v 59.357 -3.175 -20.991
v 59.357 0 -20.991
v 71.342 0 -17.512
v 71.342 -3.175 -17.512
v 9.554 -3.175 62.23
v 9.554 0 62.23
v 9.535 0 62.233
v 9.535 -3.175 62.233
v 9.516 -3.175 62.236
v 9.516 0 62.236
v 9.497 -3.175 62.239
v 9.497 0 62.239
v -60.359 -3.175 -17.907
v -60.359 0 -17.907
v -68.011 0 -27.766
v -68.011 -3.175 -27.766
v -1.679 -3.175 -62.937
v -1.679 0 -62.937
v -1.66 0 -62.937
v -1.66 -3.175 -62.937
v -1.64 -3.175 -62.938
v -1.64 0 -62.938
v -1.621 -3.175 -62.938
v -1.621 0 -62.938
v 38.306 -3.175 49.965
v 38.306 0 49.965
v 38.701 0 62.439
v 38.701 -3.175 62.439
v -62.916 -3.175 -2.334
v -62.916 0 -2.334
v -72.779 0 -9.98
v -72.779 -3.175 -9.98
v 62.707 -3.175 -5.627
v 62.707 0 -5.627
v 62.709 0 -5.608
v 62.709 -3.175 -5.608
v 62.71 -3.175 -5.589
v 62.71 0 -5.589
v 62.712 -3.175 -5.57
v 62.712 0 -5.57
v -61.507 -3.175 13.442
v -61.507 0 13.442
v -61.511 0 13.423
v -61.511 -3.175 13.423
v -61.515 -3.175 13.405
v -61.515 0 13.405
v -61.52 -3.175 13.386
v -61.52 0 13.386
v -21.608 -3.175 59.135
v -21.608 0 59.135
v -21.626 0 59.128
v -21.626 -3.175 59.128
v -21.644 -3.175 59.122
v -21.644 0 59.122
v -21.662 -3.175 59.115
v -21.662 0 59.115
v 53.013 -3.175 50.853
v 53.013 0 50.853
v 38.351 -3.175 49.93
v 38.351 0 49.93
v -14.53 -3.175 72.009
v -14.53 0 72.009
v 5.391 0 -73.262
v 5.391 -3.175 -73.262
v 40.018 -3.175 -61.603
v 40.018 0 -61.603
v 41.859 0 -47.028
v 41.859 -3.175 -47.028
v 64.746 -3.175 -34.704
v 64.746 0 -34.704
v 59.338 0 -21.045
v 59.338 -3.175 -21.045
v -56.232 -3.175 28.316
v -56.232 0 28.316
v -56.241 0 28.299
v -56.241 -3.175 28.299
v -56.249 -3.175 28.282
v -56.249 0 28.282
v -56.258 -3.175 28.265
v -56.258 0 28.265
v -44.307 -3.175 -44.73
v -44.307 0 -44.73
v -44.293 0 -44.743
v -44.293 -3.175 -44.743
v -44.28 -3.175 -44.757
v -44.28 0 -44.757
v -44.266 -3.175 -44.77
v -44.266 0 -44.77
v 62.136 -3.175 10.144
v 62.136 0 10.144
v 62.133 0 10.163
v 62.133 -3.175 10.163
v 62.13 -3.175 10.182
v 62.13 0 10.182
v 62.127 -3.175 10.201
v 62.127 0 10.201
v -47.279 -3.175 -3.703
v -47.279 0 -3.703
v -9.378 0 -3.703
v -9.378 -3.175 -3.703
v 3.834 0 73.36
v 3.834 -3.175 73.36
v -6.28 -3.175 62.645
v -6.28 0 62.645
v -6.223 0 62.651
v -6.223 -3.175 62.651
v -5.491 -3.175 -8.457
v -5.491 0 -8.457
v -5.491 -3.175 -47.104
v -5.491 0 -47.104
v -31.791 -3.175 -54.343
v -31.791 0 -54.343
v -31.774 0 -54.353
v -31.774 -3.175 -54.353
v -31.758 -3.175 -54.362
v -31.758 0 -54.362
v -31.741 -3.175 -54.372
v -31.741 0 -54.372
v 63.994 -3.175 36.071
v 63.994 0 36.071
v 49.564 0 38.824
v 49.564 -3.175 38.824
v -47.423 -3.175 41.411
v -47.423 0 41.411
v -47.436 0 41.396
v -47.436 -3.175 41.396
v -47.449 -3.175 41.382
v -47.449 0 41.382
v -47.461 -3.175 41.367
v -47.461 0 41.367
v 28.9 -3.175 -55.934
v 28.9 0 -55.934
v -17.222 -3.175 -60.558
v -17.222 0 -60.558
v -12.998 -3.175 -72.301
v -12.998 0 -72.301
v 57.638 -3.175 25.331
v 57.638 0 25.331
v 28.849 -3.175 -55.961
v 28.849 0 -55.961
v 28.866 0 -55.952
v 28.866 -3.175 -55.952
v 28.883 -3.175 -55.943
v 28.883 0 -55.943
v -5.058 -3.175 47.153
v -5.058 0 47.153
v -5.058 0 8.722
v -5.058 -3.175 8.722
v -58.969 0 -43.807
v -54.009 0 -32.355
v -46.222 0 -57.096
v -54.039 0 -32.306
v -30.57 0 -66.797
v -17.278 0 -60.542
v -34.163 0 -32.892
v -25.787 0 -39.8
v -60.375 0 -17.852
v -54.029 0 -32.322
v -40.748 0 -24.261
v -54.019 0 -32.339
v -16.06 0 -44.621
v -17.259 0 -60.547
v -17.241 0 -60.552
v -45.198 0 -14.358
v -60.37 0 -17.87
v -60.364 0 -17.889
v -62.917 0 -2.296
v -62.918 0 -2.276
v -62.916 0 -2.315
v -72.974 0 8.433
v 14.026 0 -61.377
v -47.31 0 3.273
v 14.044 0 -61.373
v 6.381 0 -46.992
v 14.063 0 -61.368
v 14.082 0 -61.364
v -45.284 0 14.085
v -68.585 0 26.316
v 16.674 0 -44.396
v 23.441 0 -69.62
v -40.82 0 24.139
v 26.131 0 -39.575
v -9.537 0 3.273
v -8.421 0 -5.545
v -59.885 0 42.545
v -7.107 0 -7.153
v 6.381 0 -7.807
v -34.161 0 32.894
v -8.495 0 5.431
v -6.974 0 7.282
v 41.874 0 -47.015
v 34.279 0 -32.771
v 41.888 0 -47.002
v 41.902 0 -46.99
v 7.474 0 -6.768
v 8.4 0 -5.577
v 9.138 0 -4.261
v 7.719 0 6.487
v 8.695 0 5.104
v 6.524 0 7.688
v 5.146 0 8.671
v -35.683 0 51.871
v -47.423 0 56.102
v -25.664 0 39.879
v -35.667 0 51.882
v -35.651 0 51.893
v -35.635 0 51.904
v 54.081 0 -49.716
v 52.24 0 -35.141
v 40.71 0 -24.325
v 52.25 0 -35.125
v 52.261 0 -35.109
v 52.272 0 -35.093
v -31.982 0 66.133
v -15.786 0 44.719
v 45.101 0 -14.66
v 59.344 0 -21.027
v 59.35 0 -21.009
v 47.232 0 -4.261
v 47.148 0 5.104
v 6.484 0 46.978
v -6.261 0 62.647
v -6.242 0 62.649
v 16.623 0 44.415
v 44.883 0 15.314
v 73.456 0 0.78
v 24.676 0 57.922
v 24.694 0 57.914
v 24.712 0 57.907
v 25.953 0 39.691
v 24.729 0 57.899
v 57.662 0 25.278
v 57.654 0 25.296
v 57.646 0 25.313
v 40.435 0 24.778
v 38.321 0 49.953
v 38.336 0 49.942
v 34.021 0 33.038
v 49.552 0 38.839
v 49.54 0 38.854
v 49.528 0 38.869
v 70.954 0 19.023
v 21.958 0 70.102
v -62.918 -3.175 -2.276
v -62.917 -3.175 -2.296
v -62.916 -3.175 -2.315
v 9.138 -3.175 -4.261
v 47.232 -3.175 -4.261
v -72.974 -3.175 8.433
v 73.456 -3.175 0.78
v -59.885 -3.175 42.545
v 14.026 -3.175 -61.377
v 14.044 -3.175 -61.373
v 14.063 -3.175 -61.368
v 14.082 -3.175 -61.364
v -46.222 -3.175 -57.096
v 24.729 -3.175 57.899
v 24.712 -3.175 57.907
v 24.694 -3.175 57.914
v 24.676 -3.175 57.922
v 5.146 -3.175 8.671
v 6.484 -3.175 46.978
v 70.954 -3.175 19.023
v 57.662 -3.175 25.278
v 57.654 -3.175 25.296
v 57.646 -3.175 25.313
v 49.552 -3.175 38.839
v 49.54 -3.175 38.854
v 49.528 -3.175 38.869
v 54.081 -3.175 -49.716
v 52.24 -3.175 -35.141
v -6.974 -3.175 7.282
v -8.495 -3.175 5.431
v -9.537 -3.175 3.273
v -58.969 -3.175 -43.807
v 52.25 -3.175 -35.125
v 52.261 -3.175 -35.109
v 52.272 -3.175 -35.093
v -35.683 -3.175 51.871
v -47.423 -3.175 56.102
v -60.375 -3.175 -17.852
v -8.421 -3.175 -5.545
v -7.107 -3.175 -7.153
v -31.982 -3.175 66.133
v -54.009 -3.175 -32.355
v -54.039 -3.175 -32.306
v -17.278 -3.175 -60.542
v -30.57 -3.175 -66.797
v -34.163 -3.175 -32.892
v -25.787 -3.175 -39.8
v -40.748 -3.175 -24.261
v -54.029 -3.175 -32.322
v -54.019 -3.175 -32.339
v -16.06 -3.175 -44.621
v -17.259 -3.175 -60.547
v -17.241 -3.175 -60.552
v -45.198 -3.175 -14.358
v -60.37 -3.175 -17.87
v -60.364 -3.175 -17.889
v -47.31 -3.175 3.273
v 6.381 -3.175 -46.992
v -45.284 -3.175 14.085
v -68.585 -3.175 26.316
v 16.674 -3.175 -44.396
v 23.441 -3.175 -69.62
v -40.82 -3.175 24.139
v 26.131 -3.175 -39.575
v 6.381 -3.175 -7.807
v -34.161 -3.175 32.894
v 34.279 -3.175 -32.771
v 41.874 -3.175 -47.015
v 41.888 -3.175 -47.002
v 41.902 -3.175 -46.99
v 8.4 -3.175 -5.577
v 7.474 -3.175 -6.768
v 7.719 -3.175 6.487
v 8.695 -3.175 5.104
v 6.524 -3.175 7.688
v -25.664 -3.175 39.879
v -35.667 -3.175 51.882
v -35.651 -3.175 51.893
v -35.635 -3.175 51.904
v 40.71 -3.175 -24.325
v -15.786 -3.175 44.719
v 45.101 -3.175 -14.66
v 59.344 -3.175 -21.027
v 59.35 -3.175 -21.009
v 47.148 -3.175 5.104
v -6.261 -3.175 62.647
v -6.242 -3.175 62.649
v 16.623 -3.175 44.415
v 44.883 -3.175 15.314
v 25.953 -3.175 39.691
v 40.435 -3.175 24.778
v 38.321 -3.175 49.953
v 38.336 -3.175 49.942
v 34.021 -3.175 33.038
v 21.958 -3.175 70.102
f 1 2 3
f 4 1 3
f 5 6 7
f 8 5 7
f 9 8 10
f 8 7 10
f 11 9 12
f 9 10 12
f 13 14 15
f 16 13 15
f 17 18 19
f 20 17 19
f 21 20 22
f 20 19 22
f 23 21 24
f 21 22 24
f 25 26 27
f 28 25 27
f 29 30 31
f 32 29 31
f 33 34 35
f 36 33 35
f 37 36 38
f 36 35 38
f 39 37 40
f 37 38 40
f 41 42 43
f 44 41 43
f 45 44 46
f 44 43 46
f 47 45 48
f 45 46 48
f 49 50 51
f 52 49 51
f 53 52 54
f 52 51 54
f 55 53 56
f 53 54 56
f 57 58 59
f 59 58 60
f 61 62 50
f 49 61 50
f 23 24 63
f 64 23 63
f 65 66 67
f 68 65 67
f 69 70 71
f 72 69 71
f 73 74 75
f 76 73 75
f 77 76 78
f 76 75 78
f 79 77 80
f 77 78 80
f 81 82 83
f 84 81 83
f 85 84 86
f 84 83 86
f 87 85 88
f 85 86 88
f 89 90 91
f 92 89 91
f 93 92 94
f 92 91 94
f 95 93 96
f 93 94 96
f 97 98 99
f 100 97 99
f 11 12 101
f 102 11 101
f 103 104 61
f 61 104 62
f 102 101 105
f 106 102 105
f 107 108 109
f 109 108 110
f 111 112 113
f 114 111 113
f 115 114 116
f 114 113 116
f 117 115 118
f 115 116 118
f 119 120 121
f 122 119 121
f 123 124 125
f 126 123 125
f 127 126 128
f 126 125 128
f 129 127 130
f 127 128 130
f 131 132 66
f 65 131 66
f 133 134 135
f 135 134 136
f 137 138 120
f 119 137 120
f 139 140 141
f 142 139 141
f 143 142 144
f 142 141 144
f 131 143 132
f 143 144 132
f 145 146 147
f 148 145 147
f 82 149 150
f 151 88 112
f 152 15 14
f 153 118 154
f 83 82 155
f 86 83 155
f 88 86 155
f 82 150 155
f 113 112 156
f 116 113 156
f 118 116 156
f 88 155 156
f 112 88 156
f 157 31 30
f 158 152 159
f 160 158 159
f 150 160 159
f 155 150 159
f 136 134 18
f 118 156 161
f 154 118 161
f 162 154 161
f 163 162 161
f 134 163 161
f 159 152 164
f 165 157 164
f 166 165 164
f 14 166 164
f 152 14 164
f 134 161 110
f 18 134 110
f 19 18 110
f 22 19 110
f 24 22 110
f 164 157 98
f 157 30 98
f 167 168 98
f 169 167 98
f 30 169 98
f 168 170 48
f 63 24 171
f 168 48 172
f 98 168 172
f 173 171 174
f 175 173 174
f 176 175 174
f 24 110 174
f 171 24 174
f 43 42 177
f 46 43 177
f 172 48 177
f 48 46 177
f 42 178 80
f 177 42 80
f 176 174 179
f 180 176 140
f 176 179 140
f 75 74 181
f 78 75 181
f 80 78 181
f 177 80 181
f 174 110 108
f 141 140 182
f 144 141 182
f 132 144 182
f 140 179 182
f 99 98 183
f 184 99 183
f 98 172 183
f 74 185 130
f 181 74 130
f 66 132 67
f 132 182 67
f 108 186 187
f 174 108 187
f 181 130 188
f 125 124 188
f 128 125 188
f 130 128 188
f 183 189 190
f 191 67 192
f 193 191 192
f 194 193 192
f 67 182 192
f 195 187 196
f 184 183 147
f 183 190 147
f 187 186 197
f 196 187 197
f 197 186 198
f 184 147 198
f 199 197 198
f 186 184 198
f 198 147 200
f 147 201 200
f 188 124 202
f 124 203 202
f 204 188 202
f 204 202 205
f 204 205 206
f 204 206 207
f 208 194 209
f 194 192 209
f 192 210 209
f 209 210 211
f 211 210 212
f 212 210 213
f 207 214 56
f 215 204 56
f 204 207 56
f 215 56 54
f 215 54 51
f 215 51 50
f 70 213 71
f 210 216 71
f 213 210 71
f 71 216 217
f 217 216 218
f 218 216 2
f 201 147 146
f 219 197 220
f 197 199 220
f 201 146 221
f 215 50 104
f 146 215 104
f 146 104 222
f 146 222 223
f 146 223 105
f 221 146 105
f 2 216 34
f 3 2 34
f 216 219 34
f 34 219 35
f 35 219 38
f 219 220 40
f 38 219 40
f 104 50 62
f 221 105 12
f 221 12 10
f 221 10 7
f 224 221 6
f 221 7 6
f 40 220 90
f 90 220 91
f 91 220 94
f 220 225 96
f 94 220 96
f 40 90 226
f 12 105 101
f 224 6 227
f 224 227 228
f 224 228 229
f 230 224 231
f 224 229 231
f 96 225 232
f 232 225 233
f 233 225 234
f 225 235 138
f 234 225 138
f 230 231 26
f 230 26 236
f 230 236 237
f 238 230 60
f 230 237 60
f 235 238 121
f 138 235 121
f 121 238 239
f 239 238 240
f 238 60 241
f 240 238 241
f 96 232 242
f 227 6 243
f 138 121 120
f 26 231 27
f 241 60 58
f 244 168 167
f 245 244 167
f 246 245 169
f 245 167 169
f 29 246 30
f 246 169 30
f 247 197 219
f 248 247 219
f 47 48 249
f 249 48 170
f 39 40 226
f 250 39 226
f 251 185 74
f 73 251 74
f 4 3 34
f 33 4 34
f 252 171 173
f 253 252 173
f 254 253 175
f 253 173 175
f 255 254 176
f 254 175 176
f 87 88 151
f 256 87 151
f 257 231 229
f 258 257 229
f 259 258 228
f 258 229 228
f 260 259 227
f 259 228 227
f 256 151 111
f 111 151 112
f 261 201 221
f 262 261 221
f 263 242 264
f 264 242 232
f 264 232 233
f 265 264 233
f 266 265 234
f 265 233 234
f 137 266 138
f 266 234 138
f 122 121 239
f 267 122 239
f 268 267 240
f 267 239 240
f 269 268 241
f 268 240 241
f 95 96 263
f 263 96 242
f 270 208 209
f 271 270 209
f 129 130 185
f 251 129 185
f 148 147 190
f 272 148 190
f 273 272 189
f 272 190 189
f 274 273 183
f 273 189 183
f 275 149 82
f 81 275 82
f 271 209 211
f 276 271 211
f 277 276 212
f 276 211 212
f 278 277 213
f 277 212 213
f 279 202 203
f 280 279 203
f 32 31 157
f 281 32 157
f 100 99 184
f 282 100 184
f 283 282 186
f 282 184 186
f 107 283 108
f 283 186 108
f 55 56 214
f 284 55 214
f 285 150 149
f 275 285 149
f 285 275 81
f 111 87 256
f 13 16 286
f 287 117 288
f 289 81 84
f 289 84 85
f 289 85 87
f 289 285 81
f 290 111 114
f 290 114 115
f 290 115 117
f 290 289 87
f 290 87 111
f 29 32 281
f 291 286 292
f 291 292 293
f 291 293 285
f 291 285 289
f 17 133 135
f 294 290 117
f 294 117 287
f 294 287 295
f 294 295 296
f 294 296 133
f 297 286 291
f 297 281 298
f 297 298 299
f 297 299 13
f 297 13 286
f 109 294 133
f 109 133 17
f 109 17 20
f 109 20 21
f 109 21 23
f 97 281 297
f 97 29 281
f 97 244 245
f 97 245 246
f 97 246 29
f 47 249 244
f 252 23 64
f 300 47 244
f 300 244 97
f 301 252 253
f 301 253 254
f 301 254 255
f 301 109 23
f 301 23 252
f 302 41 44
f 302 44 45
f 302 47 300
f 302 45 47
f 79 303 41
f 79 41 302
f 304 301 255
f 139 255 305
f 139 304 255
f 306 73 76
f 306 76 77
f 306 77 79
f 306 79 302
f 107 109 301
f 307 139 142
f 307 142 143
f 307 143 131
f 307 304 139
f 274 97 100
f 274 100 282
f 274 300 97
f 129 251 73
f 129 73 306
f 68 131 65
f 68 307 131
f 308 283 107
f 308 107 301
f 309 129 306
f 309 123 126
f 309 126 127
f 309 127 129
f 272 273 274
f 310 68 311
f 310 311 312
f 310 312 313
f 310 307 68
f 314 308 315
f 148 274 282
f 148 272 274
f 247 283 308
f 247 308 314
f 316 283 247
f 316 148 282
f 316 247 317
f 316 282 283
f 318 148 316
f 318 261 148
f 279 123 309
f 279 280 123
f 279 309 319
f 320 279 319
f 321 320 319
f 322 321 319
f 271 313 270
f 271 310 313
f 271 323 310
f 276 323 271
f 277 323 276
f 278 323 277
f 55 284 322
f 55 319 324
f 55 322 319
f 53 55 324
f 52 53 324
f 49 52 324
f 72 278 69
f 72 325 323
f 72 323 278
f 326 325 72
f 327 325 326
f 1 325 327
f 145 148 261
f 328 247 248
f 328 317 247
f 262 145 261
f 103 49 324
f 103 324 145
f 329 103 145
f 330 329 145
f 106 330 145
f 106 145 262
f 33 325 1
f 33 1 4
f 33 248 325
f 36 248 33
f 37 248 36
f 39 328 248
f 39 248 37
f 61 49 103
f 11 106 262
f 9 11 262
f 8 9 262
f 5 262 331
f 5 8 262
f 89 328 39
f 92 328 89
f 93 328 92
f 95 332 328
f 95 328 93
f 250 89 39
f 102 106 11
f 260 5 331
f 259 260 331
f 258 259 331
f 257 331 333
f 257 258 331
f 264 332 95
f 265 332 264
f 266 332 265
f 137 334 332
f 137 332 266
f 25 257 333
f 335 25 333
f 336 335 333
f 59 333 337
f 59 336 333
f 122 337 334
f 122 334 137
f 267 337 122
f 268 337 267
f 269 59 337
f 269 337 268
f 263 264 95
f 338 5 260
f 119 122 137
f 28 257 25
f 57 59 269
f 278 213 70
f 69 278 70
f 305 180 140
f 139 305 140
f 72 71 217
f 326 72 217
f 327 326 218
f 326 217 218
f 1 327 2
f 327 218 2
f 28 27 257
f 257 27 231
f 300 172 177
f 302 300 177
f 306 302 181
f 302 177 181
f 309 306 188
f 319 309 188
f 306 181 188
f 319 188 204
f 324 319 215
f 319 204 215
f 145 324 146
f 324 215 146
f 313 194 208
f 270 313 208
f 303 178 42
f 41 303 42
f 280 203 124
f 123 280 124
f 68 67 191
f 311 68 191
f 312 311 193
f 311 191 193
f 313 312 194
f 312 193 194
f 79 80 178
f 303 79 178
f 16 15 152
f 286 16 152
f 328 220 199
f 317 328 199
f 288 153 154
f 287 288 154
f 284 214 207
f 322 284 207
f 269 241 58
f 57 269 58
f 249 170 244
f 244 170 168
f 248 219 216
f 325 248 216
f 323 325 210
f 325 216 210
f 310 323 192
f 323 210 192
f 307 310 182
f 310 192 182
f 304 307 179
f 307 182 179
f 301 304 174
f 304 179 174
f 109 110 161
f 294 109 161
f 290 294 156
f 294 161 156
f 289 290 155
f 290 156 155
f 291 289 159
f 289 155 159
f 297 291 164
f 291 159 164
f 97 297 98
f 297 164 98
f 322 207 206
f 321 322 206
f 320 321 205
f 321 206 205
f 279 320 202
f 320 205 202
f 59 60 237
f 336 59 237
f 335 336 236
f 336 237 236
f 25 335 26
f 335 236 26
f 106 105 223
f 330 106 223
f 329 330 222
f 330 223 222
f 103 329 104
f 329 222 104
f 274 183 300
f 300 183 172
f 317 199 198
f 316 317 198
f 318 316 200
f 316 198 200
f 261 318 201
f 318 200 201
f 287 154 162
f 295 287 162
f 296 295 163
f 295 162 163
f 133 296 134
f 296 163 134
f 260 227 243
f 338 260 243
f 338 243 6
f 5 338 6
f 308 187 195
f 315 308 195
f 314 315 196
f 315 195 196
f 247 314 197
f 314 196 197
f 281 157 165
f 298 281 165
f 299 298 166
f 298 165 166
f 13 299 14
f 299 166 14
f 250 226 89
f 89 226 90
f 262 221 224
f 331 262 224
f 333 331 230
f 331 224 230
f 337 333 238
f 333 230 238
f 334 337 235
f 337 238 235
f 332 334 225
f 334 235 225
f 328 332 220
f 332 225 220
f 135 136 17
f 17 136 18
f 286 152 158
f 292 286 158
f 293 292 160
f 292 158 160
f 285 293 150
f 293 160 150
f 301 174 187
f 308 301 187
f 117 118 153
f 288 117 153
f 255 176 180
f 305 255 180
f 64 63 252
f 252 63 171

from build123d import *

# Parameters (mm, degrees)
F1_DEPTH = 3.175


with BuildPart() as f1:
    # F0 (on Front) → F1 (new body)
    with BuildSketch(Plane.XZ):
        with BuildLine():
            ThreePointArc((62.7121740453, -5.569838893), (62.8972882371, -2.7876533502), (62.9590333374, 0))
            ThreePointArc((62.9590333374, 0), (62.7530476298, 5.088702384), (62.1364383711, 10.1441069263))
            ThreePointArc((62.1364383711, 10.1441069263), (62.1317848967, 10.1725701931), (62.1271183838, 10.2010313252))
            ThreePointArc((62.1271183838, 10.2010313252), (60.3668960989, 17.879533947), (57.6615710919, 25.2781150008))
            ThreePointArc((57.6615710919, 25.2781150008), (57.6499852883, 25.3045267697), (57.6383873868, 25.3309332285))
            ThreePointArc((57.6383873868, 25.3309332285), (54.0238997712, 32.3304520892), (49.5636152365, 38.8238061434))
            ThreePointArc((49.5636152365, 38.8238061434), (49.5458250824, 38.8465068659), (49.5280245311, 38.8691994364))
            ThreePointArc((49.5280245311, 38.8691994364), (44.2863831348, 44.7499290236), (38.3513951536, 49.9300547621))
            ThreePointArc((38.3513951536, 49.9300547621), (38.3285184698, 49.9476180682), (38.3056337427, 49.9651708928))
            ThreePointArc((38.3056337427, 49.9651708928), (31.7661901722, 54.3576033387), (24.7294158667, 57.8990144102))
            ThreePointArc((24.7294158667, 57.8990144102), (24.7028900793, 57.9103367328), (24.6763591081, 57.9216469029))
            ThreePointArc((24.6763591081, 57.9216469029), (17.2500106531, 60.5497895227), (9.5535964324, 62.2299660452))
            ThreePointArc((9.5535964324, 62.2299660452), (9.5250882543, 62.2343359612), (9.4965780774, 62.2386928172))
            ThreePointArc((9.4965780774, 62.2386928172), (1.6499495237, 62.9374097445), (-6.2225106014, 62.6507800478))
            ThreePointArc((-6.2225106014, 62.6507800478), (-6.2512098966, 62.6479229792), (-6.2799078799, 62.6450527639))
            ThreePointArc((-6.2799078799, 62.6450527639), (-14.0537840025, 61.3704410444), (-21.6076344094, 59.1350151265))
            ThreePointArc((-21.6076344094, 59.1350151265), (-21.6347215393, 59.1251105935), (-21.6618041293, 59.1151936531))
            ThreePointArc((-21.6618041293, 59.1151936531), (-28.8744665935, 55.9473418289), (-35.63507108, 51.9035797214))
            ThreePointArc((-35.63507108, 51.9035797214), (-35.6588440608, 51.8872500623), (-35.6826095586, 51.8709095146))
            ThreePointArc((-35.6826095586, 51.8709095146), (-41.8808602557, 47.0088653663), (-47.4234251781, 41.4108515145))
            ThreePointArc((-47.4234251781, 41.4108515145), (-47.4423902659, 41.3891227817), (-47.4613453979, 41.3673853634))
            ThreePointArc((-47.4613453979, 41.3673853634), (-52.2557254409, 35.1166490062), (-56.2319910611, 28.3161272084))
            ThreePointArc((-56.2319910611, 28.3161272084), (-56.2449566097, 28.2903646982), (-56.2579103552, 28.2645962512))
            ThreePointArc((-56.2579103552, 28.2645962512), (-59.3471712136, 21.017924439), (-61.5072941389, 13.4421964904))
            ThreePointArc((-61.5072941389, 13.4421964904), (-61.5134454752, 13.414018956), (-61.5195839028, 13.3858386066))
            ThreePointArc((-61.5195839028, 13.3858386066), (-62.7096159553, 5.5985663809), (-62.917867718, -2.27635687))
            ThreePointArc((-62.917867718, -2.27635687), (-62.9168183308, -2.3051789305), (-62.9157557406, -2.3340005073))
            ThreePointArc((-62.9157557406, -2.3340005073), (-62.1317848967, -10.1725701931), (-60.3750802726, -17.8518783565))
            ThreePointArc((-60.3750802726, -17.8518783565), (-60.3668960989, -17.879533947), (-60.3586992572, -17.9071857854))
            ThreePointArc((-60.3586992572, -17.9071857854), (-57.6499852883, -25.3045267697), (-54.0387044897, -32.3057006712))
            ThreePointArc((-54.0387044897, -32.3057006712), (-54.0238997712, -32.3304520892), (-54.0090837158, -32.3551967227))
            ThreePointArc((-54.0090837158, -32.3551967227), (-49.5458250824, -38.8465068659), (-44.3068781632, -44.7296370006))
            ThreePointArc((-44.3068781632, -44.7296370006), (-44.2863831348, -44.7499290236), (-44.2658788129, -44.7702116557))
            ThreePointArc((-44.2658788129, -44.7702116557), (-38.3285184698, -49.9476180682), (-31.7910877325, -54.3430457332))
            ThreePointArc((-31.7910877325, -54.3430457332), (-31.7661901722, -54.3576033387), (-31.7412859458, -54.3721495371))
            ThreePointArc((-31.7412859458, -54.3721495371), (-24.7028900793, -57.9103367328), (-17.27774634, -60.5418810427))
            ThreePointArc((-17.27774634, -60.5418810427), (-17.2500106531, -60.5497895227), (-17.2222713463, -60.5576852964))
            ThreePointArc((-17.2222713463, -60.5576852964), (-9.5250882543, -62.2343359612), (-1.678780602, -62.9366473088))
            ThreePointArc((-1.678780602, -62.9366473088), (-1.6499495237, -62.9374097445), (-1.6211180991, -62.9381589728))
            ThreePointArc((-1.6211180991, -62.9381589728), (6.2512098966, -62.6479229792), (14.0256690955, -61.3768725596))
            ThreePointArc((14.0256690955, -61.3768725596), (14.0537840025, -61.3704410444), (14.0818959603, -61.3639966507))
            ThreePointArc((14.0818959603, -61.3639966507), (21.6347215393, -59.1251105935), (28.8488344208, -55.9605631792))
            ThreePointArc((28.8488344208, -55.9605631792), (28.8744665935, -55.9473418289), (28.900092707, -55.9341087379))
            ThreePointArc((28.900092707, -55.9341087379), (35.6588440608, -51.8872500623), (41.8593213809, -47.0280458057))
            ThreePointArc((41.8593213809, -47.0280458057), (41.8808602557, -47.0088653663), (41.9023903417, -46.989675062))
            ThreePointArc((41.9023903417, -46.989675062), (47.4423902659, -41.3891227817), (52.2396332309, -35.1405833572))
            ThreePointArc((52.2396332309, -35.1405833572), (52.2557254409, -35.1166490062), (52.2718066851, -35.0927072859))
            ThreePointArc((52.2718066851, -35.0927072859), (56.2449566097, -28.2903646982), (59.3375368009, -21.0451088183))
            ThreePointArc((59.3375368009, -21.0451088183), (59.3471712136, -21.017924439), (59.3567931722, -20.9907356491))
            ThreePointArc((59.3567931722, -20.9907356491), (61.5134454752, -13.414018956), (62.7070447056, -5.6272926939))
            ThreePointArc((62.7070447056, -5.6272926939), (62.7096159553, -5.5985663809), (62.7121740453, -5.569838893))
        make_face()
        with BuildLine():
            ThreePointArc((6.4842174363, 46.9780393361), (34.0214251963, 33.038218524), (47.1479445438, 5.104172893))
            ThreePointArc((47.1479445438, 5.104172893), (47.3545049388, 2.5558007797), (47.4234251781, 0))
            ThreePointArc((47.4234251781, 0), (47.375446226, -2.132686219), (47.2316064517, -4.2610571003))
            ThreePointArc((47.2316064517, -4.2610571003), (34.2791282202, -32.7707586743), (6.3807374771, -46.9922062141))
            ThreePointArc((6.3807374771, -46.9922062141), (0.448456932, -47.4213047269), (-5.4908777614, -47.1044744906))
            ThreePointArc((-5.4908777614, -47.1044744906), (-34.1626695471, -32.8921459476), (-47.2786672976, -3.7025496874))
            ThreePointArc((-47.2786672976, -3.7025496874), (-47.4229358339, -0.2154356435), (-47.3103555233, 3.2728452281))
            ThreePointArc((-47.3103555233, 3.2728452281), (-34.1610578081, 32.8938198612), (-5.0580612114, 47.1529137213))
            ThreePointArc((-5.0580612114, 47.1529137213), (0.7184188591, 47.4179831917), (6.4842174363, 46.9780393361))
        make_face(mode=Mode.SUBTRACT)
        with BuildLine():
            ThreePointArc((62.1364383711, 10.1441069263), (62.7530476298, 5.088702384), (62.9590333374, 0))
            ThreePointArc((62.9590333374, 0), (62.8972882371, -2.7876533502), (62.7121740453, -5.569838893))
            Line((62.7121740453, -5.569838893), (73.4559661565, 0.7797791477))
            Line((73.4559661565, 0.7797791477), (62.1364383711, 10.1441069263))
        make_face()
        with BuildLine():
            ThreePointArc((57.6615710919, 25.2781150008), (60.3668960989, 17.879533947), (62.1271183838, 10.2010313252))
            Line((62.1271183838, 10.2010313252), (70.9542887154, 19.0230368869))
            Line((70.9542887154, 19.0230368869), (57.6615710919, 25.2781150008))
        make_face()
        with BuildLine():
            Line((71.3421350919, -17.5124749832), (62.7070447056, -5.6272926939))
            ThreePointArc((62.7070447056, -5.6272926939), (61.5134454752, -13.414018956), (59.3567931722, -20.9907356491))
            Line((59.3567931722, -20.9907356491), (71.3421350919, -17.5124749832))
        make_face()
        with BuildLine():
            ThreePointArc((49.5636152365, 38.8238061434), (54.0238997712, 32.3304520892), (57.6383873868, 25.3309332285))
            Line((57.6383873868, 25.3309332285), (63.9942923626, 36.0710072567))
            Line((63.9942923626, 36.0710072567), (49.5636152365, 38.8238061434))
        make_face()
        with BuildLine():
            Line((64.7456153015, -34.7043559045), (59.3375368009, -21.0451088183))
            ThreePointArc((59.3375368009, -21.0451088183), (56.2449566097, -28.2903646982), (52.2718066851, -35.0927072859))
            Line((52.2718066851, -35.0927072859), (64.7456153015, -34.7043559045))
        make_face()
        with BuildLine():
            ThreePointArc((38.3513951536, 49.9300547621), (44.2863831348, 44.7499290236), (49.5280245311, 38.8691994364))
            Line((49.5280245311, 38.8691994364), (53.0132992662, 50.8525035807))
            Line((53.0132992662, 50.8525035807), (38.3513951536, 49.9300547621))
        make_face()
        with BuildLine():
            Line((54.0808903839, -49.7156345106), (52.2396332309, -35.1405833572))
            ThreePointArc((52.2396332309, -35.1405833572), (47.4423902659, -41.3891227817), (41.9023903417, -46.989675062))
            Line((41.9023903417, -46.989675062), (54.0808903839, -49.7156345106))
        make_face()
        with BuildLine():
            ThreePointArc((24.7294158667, 57.8990144102), (31.7661901722, 54.3576033387), (38.3056337427, 49.9651708928))
            Line((38.3056337427, 49.9651708928), (38.7012856076, 62.4387500822))
            Line((38.7012856076, 62.4387500822), (24.7294158667, 57.8990144102))
        make_face()
        with BuildLine():
            Line((40.0180642279, -61.6030969592), (41.8593213809, -47.0280458057))
            ThreePointArc((41.8593213809, -47.0280458057), (35.6588440608, -51.8872500623), (28.900092707, -55.9341087379))
            Line((28.900092707, -55.9341087379), (40.0180642279, -61.6030969592))
        make_face()
        with BuildLine():
            ThreePointArc((9.5535964324, 62.2299660452), (17.2500106531, 60.5497895227), (24.6763591081, 57.9216469029))
            Line((24.6763591081, 57.9216469029), (21.9575278409, 70.1017402824))
            Line((21.9575278409, 70.1017402824), (9.5535964324, 62.2299660452))
        make_face()
        with BuildLine():
            Line((23.4407559203, -69.6198102654), (28.8488344208, -55.9605631792))
            ThreePointArc((28.8488344208, -55.9605631792), (21.6347215393, -59.1251105935), (14.0818959603, -61.3639966507))
            Line((14.0818959603, -61.3639966507), (23.4407559203, -69.6198102654))
        make_face()
        with BuildLine():
            ThreePointArc((-6.2225106014, 62.6507800478), (1.6499495237, 62.9374097445), (9.4965780774, 62.2386928172))
            Line((9.4965780774, 62.2386928172), (3.8340978458, 73.3599803245))
            Line((3.8340978458, 73.3599803245), (-6.2225106014, 62.6507800478))
        make_face()
        with BuildLine():
            Line((5.3905787092, -73.2620548489), (14.0256690955, -61.3768725596))
            ThreePointArc((14.0256690955, -61.3768725596), (6.2512098966, -62.6479229792), (-1.6211180991, -62.9381589728))
            Line((-1.6211180991, -62.9381589728), (5.3905787092, -73.2620548489))
        make_face()
        with BuildLine():
            ThreePointArc((-21.6076344094, 59.1350151265), (-14.0537840025, 61.3704410444), (-6.2799078799, 62.6450527639))
            Line((-6.2799078799, 62.6450527639), (-14.5302426178, 72.0087430037))
            Line((-14.5302426178, 72.0087430037), (-21.6076344094, 59.1350151265))
        make_face()
        with BuildLine():
            Line((-12.9983083874, -72.3009750873), (-1.678780602, -62.9366473088))
            ThreePointArc((-1.678780602, -62.9366473088), (-9.5250882543, -62.2343359612), (-17.2222713463, -60.5576852964))
            Line((-17.2222713463, -60.5576852964), (-12.9983083874, -72.3009750873))
        make_face()
        with BuildLine():
            ThreePointArc((-35.63507108, 51.9035797214), (-28.8744665935, 55.9473418289), (-21.6618041293, 59.1151936531))
            Line((-21.6618041293, 59.1151936531), (-31.9815944992, 66.1329315304))
            Line((-31.9815944992, 66.1329315304), (-35.63507108, 51.9035797214))
        make_face()
        with BuildLine():
            Line((-30.5704639635, -66.7969591566), (-17.27774634, -60.5418810427))
            ThreePointArc((-17.27774634, -60.5418810427), (-24.7028900793, -57.9103367328), (-31.7412859458, -54.3721495371))
            Line((-31.7412859458, -54.3721495371), (-30.5704639635, -66.7969591566))
        make_face()
        with BuildLine():
            ThreePointArc((-47.4234251781, 41.4108515145), (-41.8808602557, 47.0088653663), (-35.6826095586, 51.8709095146))
            Line((-35.6826095586, 51.8709095146), (-47.4234251781, 56.101744749))
            Line((-47.4234251781, 56.101744749), (-47.4234251781, 41.4108515145))
        make_face()
        with BuildLine():
            Line((-46.2217648586, -57.09584462), (-31.7910877325, -54.3430457332))
            ThreePointArc((-31.7910877325, -54.3430457332), (-38.3285184698, -49.9476180682), (-44.2658788129, -44.7702116557))
            Line((-44.2658788129, -44.7702116557), (-46.2217648586, -57.09584462))
        make_face()
        with BuildLine():
            ThreePointArc((-56.2319910611, 28.3161272084), (-52.2557254409, 35.1166490062), (-47.4613453979, 41.3673853634))
            Line((-47.4613453979, 41.3673853634), (-59.8854676419, 42.5454790173))
            Line((-59.8854676419, 42.5454790173), (-56.2319910611, 28.3161272084))
        make_face()
        with BuildLine():
            Line((-58.9687822758, -43.8071881821), (-44.3068781632, -44.7296370006))
            ThreePointArc((-44.3068781632, -44.7296370006), (-49.5458250824, -38.8465068659), (-54.0090837158, -32.3551967227))
            Line((-54.0090837158, -32.3551967227), (-58.9687822758, -43.8071881821))
        make_face()
        with BuildLine():
            ThreePointArc((-61.5072941389, 13.4421964904), (-59.3471712136, 21.017924439), (-56.2579103552, 28.2645962512))
            Line((-56.2579103552, 28.2645962512), (-68.5846859305, 26.3159243676))
            Line((-68.5846859305, 26.3159243676), (-61.5072941389, 13.4421964904))
        make_face()
        with BuildLine():
            Line((-68.0105742306, -27.7659649991), (-54.0387044897, -32.3057006712))
            ThreePointArc((-54.0387044897, -32.3057006712), (-57.6499852883, -25.3045267697), (-60.3586992572, -17.9071857854))
            Line((-60.3586992572, -17.9071857854), (-68.0105742306, -27.7659649991))
        make_face()
        with BuildLine():
            ThreePointArc((-62.917867718, -2.27635687), (-62.7096159553, 5.5985663809), (-61.5195839028, 13.3858386066))
            Line((-61.5195839028, 13.3858386066), (-72.9744761652, 8.4328434067))
            Line((-72.9744761652, 8.4328434067), (-62.917867718, -2.27635687))
        make_face()
        with BuildLine():
            Line((-72.7790116811, -9.9801041192), (-60.3750802726, -17.8518783565))
            ThreePointArc((-60.3750802726, -17.8518783565), (-62.1317848967, -10.1725701931), (-62.9157557406, -2.3340005073))
            Line((-62.9157557406, -2.3340005073), (-72.7790116811, -9.9801041192))
        make_face()
        with BuildLine():
            ThreePointArc((-5.0580612114, 8.722388835), (0.0508326683, 10.0827310907), (5.1457507073, 8.6709457308))
            Line((5.1457507073, 8.6709457308), (6.4842174363, 46.9780393361))
            ThreePointArc((6.4842174363, 46.9780393361), (0.7184188591, 47.4179831917), (-5.0580612114, 47.1529137213))
            Line((-5.0580612114, 47.1529137213), (-5.0580612114, 8.722388835))
        make_face()
        with BuildLine():
            Line((6.3807374771, -46.9922062141), (6.3807374771, -7.8070634336))
            ThreePointArc((6.3807374771, -7.8070634336), (0.5508551492, -10.0678005946), (-5.4908777614, -8.456613484))
            Line((-5.4908777614, -8.456613484), (-5.4908777614, -47.1044744906))
            ThreePointArc((-5.4908777614, -47.1044744906), (0.448456932, -47.4213047269), (6.3807374771, -46.9922062141))
        make_face()
        with BuildLine():
            ThreePointArc((8.6954855693, 5.104172893), (9.7298357417, 2.644682712), (10.0828592278, 0))
            ThreePointArc((10.0828592278, 0), (9.8438723199, -2.1822529543), (9.1382406729, -4.2610571003))
            Line((9.1382406729, -4.2610571003), (47.2316064517, -4.2610571003))
            ThreePointArc((47.2316064517, -4.2610571003), (47.375446226, -2.132686219), (47.4234251781, 0))
            ThreePointArc((47.4234251781, 0), (47.3545049388, 2.5558007797), (47.1479445438, 5.104172893))
            Line((47.1479445438, 5.104172893), (8.6954855693, 5.104172893))
        make_face()
        with BuildLine():
            ThreePointArc((-9.3784420892, -3.7025496874), (-10.0802584886, -0.228995655), (-9.5369038121, 3.2728452281))
            Line((-9.5369038121, 3.2728452281), (-47.3103555233, 3.2728452281))
            ThreePointArc((-47.3103555233, 3.2728452281), (-47.4229358339, -0.2154356435), (-47.2786672976, -3.7025496874))
            Line((-47.2786672976, -3.7025496874), (-9.3784420892, -3.7025496874))
        make_face()
        with BuildLine():
            ThreePointArc((9.1382406729, -4.2610571003), (9.8438723199, -2.1822529543), (10.0828592278, 0))
            ThreePointArc((10.0828592278, 0), (9.7298357417, 2.644682712), (8.6954855693, 5.104172893))
            ThreePointArc((8.6954855693, 5.104172893), (7.1467071113, 7.1125682895), (5.1457507073, 8.6709457308))
            ThreePointArc((5.1457507073, 8.6709457308), (0.0508326683, 10.0827310907), (-5.0580612114, 8.722388835))
            ThreePointArc((-5.0580612114, 8.722388835), (-7.7895848664, 6.4020635593), (-9.5369038121, 3.2728452281))
            ThreePointArc((-9.5369038121, 3.2728452281), (-10.0802584886, -0.228995655), (-9.3784420892, -3.7025496874))
            ThreePointArc((-9.3784420892, -3.7025496874), (-7.8054115106, -6.3827581309), (-5.4908777614, -8.456613484))
            ThreePointArc((-5.4908777614, -8.456613484), (0.5508551492, -10.0678005946), (6.3807374771, -7.8070634336))
            ThreePointArc((6.3807374771, -7.8070634336), (7.9594730312, -6.1895750479), (9.1382406729, -4.2610571003))
        make_face()
    extrude(amount=F1_DEPTH)


solid = f1.part
